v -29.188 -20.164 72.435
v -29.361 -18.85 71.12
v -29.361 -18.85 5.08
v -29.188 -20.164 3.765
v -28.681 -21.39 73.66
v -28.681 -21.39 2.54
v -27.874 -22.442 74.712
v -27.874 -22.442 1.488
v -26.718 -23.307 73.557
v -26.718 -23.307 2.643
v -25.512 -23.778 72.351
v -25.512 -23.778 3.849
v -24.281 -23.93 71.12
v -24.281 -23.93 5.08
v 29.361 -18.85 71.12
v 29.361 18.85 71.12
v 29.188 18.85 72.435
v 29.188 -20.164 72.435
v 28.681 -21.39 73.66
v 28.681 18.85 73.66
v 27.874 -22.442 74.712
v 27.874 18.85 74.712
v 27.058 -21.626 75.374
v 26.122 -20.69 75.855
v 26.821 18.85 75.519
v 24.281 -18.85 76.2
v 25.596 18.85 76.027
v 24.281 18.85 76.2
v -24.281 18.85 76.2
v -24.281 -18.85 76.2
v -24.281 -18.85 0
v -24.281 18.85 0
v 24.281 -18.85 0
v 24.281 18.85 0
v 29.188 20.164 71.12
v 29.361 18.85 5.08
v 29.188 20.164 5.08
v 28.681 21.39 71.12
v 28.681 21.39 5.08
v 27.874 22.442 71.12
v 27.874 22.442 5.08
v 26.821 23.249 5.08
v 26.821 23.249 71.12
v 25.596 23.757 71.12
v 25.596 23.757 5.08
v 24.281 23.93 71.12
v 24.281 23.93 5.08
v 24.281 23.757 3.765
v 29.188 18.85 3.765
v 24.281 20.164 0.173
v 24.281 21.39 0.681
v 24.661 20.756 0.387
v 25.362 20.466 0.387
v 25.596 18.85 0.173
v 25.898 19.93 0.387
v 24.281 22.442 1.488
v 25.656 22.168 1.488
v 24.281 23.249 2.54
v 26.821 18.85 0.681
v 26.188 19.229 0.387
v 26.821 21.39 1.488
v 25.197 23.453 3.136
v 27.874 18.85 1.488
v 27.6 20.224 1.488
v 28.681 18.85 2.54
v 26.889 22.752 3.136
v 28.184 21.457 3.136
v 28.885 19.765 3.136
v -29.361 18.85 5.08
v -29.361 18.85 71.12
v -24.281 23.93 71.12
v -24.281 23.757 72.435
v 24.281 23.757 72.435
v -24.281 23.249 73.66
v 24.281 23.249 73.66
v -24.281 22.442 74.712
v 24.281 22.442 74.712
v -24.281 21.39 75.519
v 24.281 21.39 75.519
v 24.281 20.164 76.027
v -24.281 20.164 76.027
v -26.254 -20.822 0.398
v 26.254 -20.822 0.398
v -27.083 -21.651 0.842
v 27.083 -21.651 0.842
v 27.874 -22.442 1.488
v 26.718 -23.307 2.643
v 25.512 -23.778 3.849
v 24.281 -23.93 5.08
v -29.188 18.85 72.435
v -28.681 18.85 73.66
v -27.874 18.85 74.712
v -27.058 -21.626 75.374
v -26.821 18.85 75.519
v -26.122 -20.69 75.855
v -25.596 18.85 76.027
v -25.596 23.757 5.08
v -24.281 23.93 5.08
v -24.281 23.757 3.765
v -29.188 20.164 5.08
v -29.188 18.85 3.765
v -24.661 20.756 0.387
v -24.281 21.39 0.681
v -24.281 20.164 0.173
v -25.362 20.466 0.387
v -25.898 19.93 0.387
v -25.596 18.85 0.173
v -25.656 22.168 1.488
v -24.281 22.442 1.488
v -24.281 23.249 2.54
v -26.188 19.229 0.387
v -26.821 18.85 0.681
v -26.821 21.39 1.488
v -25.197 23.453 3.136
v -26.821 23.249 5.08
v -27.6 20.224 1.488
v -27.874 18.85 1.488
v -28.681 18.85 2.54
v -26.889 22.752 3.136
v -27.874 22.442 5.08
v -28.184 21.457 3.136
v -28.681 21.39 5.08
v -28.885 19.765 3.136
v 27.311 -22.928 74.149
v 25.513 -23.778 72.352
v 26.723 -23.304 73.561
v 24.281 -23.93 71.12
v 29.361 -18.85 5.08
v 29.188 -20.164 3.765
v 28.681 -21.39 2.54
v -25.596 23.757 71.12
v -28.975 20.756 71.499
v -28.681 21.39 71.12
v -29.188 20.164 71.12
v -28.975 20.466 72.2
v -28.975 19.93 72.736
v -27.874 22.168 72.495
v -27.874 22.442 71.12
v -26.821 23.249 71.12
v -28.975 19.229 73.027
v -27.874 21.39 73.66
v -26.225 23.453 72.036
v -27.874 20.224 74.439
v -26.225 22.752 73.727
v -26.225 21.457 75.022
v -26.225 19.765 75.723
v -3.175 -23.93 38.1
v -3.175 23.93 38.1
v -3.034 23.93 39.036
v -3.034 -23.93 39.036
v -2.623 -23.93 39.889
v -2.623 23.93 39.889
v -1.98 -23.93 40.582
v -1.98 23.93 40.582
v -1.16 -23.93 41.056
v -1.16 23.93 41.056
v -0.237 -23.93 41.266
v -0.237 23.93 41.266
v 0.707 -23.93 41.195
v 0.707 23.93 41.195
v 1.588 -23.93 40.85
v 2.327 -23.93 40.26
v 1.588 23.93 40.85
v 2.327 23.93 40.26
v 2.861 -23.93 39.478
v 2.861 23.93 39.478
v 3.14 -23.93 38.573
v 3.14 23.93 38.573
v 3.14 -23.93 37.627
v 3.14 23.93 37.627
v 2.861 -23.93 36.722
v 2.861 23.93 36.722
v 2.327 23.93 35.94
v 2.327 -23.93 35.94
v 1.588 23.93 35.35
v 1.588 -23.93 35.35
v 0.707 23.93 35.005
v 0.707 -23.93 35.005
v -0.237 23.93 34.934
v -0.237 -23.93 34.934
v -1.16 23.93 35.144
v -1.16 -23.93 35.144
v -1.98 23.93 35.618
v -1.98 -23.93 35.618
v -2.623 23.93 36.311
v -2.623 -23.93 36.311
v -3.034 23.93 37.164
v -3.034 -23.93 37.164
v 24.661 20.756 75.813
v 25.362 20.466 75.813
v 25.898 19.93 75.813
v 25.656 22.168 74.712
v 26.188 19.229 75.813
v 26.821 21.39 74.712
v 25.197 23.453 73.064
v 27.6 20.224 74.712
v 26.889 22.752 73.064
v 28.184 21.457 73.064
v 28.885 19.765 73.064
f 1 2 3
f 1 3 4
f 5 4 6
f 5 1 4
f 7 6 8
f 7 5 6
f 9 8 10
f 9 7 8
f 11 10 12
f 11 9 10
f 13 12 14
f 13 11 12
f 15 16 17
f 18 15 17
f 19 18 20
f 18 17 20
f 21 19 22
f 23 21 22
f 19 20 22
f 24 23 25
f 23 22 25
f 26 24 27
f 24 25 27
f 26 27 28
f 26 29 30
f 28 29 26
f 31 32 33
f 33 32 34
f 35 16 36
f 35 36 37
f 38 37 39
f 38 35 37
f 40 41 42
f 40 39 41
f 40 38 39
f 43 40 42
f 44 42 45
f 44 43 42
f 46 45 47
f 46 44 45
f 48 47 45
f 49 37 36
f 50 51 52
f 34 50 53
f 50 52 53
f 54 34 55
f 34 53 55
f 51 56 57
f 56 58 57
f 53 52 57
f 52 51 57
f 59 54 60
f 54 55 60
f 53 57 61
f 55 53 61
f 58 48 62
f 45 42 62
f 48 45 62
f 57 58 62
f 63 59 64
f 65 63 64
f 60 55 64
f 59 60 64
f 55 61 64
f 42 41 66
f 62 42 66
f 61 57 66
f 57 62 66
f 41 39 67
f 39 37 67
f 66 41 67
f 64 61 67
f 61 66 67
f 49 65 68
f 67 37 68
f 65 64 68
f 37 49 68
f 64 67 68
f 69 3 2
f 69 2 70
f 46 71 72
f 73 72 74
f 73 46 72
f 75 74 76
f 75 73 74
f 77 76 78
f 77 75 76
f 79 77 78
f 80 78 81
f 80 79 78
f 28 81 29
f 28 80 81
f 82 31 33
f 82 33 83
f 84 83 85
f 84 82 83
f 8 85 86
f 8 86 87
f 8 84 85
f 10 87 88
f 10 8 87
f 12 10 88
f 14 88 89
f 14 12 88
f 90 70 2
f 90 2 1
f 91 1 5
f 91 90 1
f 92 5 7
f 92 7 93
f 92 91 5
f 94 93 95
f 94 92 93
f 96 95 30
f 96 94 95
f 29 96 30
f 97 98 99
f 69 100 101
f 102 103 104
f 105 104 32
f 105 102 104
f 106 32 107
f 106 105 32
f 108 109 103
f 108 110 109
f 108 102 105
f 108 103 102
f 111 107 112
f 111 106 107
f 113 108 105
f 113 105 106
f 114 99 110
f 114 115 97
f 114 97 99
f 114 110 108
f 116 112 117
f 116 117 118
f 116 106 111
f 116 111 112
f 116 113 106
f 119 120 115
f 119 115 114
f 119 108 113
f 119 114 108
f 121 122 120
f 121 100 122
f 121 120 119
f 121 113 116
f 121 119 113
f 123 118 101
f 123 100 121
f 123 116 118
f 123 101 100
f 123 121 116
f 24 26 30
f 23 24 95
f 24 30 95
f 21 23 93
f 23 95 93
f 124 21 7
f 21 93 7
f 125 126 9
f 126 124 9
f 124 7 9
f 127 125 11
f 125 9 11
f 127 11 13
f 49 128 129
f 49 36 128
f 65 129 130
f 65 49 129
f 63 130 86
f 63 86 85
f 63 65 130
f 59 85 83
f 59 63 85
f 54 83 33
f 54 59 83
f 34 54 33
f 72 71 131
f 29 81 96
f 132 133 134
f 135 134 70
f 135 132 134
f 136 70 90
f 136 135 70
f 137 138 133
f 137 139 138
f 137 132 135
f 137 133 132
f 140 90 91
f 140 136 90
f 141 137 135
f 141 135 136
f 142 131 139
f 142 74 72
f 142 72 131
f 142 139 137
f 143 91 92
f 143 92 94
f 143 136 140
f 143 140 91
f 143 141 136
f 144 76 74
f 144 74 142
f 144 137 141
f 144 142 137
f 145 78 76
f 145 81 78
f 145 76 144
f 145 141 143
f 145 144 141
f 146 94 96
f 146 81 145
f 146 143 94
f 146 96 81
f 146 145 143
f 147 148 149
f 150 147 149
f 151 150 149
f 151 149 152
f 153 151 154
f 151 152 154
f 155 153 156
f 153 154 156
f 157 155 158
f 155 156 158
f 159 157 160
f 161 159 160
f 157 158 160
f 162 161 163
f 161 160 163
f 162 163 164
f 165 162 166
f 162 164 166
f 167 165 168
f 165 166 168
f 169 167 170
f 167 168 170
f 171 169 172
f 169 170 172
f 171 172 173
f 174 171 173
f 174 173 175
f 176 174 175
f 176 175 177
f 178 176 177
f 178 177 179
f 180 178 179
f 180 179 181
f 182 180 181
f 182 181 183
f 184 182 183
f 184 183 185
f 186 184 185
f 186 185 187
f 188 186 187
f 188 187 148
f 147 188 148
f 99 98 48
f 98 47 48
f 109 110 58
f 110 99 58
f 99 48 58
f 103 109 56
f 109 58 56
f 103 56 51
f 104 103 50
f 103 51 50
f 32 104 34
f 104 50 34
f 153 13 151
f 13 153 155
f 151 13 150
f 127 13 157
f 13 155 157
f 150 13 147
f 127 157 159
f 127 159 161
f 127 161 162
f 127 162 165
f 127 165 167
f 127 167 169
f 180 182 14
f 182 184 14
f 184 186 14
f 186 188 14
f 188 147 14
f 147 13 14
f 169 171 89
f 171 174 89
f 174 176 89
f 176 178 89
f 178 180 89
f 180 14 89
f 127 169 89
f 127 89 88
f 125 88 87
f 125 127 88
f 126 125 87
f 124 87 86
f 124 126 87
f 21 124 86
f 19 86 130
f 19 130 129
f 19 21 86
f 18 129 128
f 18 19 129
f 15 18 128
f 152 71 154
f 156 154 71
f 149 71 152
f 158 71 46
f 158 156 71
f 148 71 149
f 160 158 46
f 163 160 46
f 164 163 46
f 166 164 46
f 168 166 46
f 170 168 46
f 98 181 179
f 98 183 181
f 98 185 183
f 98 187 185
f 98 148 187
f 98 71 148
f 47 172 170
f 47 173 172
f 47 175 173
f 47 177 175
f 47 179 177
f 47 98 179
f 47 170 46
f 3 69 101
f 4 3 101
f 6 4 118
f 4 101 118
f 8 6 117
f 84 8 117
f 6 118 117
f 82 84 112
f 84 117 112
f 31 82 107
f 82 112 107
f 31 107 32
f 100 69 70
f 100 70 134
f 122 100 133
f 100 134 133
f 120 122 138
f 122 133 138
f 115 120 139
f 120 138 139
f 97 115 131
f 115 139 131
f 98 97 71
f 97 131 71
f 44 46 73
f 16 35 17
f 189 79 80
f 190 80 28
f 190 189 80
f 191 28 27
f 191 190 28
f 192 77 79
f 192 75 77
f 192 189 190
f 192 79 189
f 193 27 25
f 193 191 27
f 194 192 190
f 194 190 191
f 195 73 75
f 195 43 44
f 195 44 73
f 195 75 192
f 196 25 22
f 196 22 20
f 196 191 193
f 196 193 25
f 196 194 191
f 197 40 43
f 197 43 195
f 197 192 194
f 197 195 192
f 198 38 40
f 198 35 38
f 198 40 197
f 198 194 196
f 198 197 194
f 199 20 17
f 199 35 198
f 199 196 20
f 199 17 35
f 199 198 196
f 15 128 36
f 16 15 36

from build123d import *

# Parameters (mm, degrees)
F0_W        = 58.722935617
F0_H        = 47.8591956198
F1_DEPTH    = 76.2
F2_R        = 5.08
F3_T1_DEPTH = 73.962935617
F5_D        = 6.35


# Not quite as in the source:
# - a fillet or chamfer that OpenCascade refuses, or shapes differently, is made with other operations: its cross-section is extruded or revolved along the edge and cut away or added


with BuildPart() as f1:
    # F0 (on Top) → F1 (new body)
    with BuildSketch(Plane.XY):
        Rectangle(F0_W, F0_H)
    extrude(amount=F1_DEPTH)

    # F2
    f2_edges = [f1.edges().sort_by_distance(p)[0] for p in [
        (29.361468, 23.929598, 38.1),
        (0, 23.929598, 76.2),
        (-29.361468, 23.929598, 38.1),
        (0, 23.929598, 0),
        (29.361468, 0, 76.2),
        (29.361468, -23.929598, 38.1),
        (29.361468, 0, 0),
        (-29.361468, 0, 76.2),
        (-29.361468, -23.929598, 38.1),
        (-29.361468, 0, 0),
    ]]
    fillet(f2_edges, radius=F2_R)

    # F3: fillet of radius 5.08 on 4 edges, made by hand

    # F3_s2 → F3_t1 (cut)
    with BuildSketch(Plane.YZ.offset(-36.9814678085)):
        with BuildLine():
            ThreePointArc((-18.8495978099, 0), (-22.4417002583, 1.4878975516), (-23.9295978099, 5.08))
            Line((-23.9295978099, 5.08), (-23.9295978099, 0))
            Line((-23.9295978099, 0), (-18.8495978099, 0))
        make_face()
        with BuildLine():
            ThreePointArc((-18.8495978099, 76.2), (-22.4417002583, 74.7121024484), (-23.9295978099, 71.12))
            Line((-23.9295978099, 71.12), (-23.9295978099, 76.2))
            Line((-23.9295978099, 76.2), (-18.8495978099, 76.2))
        make_face()
    extrude(amount=F3_T1_DEPTH, mode=Mode.SUBTRACT)

    # F5 (through all)
    with Locations(Plane.XZ.offset(23.9295978099)):
        with Locations((0, 38.1)):
            Hole(F5_D / 2)


solid = f1.part
